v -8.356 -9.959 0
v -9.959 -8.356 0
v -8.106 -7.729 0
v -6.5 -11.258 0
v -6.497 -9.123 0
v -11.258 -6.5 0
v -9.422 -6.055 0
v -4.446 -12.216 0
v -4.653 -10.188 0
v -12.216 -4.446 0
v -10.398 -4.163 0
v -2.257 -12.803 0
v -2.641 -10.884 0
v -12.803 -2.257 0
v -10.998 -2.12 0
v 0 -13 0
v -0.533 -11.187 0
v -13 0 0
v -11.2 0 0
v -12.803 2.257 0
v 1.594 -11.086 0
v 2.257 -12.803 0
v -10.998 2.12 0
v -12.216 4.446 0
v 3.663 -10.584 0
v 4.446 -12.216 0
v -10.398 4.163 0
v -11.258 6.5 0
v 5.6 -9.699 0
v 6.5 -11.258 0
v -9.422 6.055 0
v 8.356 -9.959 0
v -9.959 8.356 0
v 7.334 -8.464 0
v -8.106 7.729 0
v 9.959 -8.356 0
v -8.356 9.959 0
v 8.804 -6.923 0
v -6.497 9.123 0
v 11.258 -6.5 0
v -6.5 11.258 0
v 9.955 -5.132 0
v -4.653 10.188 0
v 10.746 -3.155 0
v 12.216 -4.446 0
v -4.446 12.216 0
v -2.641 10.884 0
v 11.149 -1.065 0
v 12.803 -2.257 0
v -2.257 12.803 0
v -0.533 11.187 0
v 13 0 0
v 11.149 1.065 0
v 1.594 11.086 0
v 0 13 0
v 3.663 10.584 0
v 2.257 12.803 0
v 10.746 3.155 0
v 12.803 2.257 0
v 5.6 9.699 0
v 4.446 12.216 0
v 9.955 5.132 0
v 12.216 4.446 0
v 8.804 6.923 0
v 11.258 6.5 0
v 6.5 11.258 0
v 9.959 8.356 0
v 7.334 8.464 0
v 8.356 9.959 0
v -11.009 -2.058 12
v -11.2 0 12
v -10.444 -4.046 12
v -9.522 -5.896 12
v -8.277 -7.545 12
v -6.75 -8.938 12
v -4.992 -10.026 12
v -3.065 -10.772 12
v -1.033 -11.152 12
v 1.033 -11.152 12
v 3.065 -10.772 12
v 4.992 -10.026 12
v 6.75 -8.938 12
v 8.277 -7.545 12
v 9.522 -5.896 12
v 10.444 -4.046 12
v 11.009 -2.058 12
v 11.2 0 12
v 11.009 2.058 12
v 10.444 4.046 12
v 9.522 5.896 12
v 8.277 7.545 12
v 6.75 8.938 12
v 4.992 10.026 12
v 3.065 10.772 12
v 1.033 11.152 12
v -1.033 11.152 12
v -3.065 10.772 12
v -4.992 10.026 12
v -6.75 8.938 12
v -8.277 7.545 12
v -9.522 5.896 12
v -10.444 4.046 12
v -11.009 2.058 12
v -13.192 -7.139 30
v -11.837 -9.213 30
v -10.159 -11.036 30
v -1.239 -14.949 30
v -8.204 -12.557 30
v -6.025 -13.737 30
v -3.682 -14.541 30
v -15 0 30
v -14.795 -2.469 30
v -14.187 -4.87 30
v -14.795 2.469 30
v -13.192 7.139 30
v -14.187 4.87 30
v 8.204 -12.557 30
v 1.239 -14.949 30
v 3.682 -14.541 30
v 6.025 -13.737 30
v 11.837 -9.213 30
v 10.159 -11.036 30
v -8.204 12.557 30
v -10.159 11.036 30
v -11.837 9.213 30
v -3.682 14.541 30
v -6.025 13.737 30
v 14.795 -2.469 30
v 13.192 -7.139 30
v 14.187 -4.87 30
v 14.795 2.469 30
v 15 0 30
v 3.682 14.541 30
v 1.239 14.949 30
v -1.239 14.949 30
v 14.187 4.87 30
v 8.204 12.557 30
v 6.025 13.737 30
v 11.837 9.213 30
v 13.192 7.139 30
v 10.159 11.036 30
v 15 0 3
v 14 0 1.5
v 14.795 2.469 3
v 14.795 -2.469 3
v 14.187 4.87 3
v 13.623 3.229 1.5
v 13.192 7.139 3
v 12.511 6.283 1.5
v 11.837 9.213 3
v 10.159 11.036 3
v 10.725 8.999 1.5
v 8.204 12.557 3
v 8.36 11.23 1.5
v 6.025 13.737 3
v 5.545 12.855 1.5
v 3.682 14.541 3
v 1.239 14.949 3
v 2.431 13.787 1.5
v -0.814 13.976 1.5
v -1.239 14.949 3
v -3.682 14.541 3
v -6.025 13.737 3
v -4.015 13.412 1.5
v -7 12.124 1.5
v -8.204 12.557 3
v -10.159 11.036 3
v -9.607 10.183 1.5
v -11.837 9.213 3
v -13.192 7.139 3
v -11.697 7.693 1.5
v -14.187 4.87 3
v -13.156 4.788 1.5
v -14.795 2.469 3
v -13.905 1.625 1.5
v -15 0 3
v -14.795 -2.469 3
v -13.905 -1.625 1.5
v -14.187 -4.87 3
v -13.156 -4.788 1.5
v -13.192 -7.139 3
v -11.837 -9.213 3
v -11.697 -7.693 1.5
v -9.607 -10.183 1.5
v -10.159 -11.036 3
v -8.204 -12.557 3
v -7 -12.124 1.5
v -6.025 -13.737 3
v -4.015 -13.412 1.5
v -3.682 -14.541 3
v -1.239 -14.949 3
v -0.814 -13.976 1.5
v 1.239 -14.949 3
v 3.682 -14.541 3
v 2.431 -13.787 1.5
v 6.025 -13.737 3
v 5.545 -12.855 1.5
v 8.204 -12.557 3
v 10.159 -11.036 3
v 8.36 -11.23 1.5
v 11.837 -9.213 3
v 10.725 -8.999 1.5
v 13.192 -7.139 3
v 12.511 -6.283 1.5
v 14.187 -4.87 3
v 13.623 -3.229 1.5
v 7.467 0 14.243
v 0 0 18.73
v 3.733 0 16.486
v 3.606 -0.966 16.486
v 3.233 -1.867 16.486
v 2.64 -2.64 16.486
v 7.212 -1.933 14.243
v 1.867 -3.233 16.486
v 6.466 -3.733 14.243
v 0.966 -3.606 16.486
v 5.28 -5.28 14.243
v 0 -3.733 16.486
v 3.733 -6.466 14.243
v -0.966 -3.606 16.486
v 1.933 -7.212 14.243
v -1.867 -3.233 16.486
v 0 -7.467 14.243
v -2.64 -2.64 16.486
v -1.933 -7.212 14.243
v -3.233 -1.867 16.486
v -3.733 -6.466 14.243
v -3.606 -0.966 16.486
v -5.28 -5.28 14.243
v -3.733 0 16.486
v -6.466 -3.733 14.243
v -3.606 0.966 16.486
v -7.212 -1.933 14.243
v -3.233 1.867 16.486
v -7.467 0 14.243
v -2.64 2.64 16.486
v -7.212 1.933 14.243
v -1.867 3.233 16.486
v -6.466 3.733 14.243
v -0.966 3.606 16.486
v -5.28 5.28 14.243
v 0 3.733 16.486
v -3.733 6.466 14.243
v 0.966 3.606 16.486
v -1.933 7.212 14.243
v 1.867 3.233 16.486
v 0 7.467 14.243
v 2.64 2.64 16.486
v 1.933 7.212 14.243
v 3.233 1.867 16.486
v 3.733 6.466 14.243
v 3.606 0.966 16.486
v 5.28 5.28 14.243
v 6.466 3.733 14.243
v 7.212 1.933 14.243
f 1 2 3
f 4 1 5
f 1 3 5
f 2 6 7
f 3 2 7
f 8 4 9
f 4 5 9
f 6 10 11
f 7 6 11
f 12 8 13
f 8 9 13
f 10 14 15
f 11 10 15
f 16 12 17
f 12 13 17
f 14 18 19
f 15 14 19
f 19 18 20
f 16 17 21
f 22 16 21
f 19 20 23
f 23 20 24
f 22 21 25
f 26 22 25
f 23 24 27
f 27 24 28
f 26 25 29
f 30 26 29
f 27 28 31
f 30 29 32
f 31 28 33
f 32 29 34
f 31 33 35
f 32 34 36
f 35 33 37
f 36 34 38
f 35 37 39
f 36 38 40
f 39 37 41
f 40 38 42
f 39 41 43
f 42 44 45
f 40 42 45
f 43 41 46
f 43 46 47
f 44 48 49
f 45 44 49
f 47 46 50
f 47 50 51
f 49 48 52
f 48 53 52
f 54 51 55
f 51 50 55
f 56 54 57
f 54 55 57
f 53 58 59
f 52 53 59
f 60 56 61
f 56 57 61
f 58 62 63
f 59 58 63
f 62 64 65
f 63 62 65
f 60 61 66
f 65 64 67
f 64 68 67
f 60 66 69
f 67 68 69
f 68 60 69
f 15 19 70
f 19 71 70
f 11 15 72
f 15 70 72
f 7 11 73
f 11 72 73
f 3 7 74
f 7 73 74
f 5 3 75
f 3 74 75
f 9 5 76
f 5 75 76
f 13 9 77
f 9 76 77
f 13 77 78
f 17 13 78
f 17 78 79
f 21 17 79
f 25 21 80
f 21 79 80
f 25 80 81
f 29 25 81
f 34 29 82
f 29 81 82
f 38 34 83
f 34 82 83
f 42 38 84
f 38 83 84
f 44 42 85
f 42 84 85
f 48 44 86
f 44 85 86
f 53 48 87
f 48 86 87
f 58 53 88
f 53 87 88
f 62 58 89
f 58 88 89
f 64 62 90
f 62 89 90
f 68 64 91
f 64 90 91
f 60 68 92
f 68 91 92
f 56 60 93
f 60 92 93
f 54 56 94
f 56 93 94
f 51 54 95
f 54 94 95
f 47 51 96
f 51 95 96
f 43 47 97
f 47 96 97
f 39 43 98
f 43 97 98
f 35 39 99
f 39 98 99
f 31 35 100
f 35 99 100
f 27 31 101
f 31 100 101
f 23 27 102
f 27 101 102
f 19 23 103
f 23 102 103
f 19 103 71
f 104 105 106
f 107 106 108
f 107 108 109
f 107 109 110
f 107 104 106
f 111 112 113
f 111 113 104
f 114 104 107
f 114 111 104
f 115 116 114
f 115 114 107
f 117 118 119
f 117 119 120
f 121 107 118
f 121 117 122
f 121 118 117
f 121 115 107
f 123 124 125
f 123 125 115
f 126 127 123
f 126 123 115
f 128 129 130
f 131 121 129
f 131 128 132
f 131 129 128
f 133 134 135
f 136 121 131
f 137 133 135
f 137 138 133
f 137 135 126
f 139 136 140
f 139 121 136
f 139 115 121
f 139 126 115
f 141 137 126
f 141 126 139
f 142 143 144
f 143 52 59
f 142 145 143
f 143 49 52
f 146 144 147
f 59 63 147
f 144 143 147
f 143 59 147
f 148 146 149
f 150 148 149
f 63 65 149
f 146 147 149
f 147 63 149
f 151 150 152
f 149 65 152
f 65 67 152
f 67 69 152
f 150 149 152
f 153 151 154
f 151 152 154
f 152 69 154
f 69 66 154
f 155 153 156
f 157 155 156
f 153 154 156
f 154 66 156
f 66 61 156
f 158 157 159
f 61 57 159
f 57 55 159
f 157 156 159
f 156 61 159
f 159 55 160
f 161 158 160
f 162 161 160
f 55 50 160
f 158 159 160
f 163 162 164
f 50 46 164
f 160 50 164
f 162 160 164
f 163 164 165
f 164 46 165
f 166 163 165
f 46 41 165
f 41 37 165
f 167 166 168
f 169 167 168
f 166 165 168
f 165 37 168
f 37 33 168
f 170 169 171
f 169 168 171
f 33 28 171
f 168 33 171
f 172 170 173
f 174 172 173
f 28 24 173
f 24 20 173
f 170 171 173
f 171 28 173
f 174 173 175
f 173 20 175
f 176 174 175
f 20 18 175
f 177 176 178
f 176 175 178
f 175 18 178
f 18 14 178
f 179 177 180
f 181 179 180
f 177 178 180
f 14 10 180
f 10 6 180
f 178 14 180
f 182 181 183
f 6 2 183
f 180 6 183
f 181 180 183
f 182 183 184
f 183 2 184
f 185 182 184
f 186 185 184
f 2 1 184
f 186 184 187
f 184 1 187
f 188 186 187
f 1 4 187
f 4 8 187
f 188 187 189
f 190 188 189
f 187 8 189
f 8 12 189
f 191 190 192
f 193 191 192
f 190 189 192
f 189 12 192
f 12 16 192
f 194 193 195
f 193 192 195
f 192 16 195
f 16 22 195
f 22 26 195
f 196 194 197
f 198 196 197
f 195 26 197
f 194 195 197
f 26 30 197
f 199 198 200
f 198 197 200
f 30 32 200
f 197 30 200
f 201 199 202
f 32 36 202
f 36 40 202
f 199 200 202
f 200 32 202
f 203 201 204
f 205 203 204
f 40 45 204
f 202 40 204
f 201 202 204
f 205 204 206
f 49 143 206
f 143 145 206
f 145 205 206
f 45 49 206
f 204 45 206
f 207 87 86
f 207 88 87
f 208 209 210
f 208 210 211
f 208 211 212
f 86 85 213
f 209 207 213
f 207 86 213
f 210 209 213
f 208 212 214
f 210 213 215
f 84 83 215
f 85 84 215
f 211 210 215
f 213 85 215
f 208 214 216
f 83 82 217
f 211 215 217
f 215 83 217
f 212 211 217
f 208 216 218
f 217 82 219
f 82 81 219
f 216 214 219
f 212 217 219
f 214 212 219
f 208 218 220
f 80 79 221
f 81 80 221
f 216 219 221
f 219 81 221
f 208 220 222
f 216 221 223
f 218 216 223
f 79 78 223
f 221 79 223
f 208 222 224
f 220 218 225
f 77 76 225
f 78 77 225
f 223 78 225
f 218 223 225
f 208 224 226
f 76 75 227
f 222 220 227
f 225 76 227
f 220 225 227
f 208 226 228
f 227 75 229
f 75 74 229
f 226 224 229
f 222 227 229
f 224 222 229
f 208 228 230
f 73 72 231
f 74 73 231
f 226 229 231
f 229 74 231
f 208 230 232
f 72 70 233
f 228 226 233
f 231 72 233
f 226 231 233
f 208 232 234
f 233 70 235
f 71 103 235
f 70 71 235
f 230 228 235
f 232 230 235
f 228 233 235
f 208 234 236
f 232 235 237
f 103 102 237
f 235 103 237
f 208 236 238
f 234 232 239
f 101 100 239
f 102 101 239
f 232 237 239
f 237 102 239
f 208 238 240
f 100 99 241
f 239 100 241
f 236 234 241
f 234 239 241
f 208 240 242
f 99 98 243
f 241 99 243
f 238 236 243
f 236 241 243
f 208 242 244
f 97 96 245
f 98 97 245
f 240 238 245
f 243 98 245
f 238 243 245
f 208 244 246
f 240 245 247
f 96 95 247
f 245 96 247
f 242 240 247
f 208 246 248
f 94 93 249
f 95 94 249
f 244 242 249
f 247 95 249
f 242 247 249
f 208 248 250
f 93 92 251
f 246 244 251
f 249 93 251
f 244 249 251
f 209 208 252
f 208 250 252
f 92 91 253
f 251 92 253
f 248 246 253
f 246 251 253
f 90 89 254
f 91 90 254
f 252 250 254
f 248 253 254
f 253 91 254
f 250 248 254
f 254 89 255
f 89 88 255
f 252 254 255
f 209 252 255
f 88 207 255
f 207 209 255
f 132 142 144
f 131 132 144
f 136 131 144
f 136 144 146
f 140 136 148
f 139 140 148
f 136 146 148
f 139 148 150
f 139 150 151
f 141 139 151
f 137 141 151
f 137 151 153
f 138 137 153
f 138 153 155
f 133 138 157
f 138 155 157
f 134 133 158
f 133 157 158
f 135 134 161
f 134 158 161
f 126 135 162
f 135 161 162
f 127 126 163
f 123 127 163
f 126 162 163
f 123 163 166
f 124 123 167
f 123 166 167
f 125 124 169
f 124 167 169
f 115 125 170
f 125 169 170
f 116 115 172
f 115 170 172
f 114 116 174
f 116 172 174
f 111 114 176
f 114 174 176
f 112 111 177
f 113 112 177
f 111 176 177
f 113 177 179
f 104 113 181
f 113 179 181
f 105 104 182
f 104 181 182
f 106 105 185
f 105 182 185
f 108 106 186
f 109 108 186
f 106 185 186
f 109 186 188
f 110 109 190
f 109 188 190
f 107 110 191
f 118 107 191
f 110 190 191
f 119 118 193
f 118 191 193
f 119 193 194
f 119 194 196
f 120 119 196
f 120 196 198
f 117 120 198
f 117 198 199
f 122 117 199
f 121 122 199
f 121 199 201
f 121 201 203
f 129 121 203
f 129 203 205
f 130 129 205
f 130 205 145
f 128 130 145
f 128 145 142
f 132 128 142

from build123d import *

# Parameters (mm, degrees)
F0_R     = 15
F1_DEPTH = 30
F3_D     = 22.4
F3_DEPTH = 12
F3_TIP   = 6.7296389331
F4_SIZE2 = 2
F4_SIZE  = 3


with BuildPart() as f1:
    # F0 (on Top) → F1 (new body)
    with BuildSketch(Plane.XY):
        Circle(F0_R)
    extrude(amount=F1_DEPTH)

    # F3
    with Locations(Plane(origin=(0, 0, 0), x_dir=(1, 0, 0), z_dir=(0, 0, -1))):
        with Locations((0, 0)):
            Hole(F3_D / 2, depth=F3_DEPTH)
            with Locations((0, 0, -(F3_DEPTH + F3_TIP / 2))):  # 118° drill point
                Cone(0, F3_D / 2, F3_TIP, mode=Mode.SUBTRACT)

    # F4
    f4_edges = [f1.edges().sort_by_distance(p)[0] for p in [
        (-15, 0, 0),
    ]]
    f4_side = f1.faces().sort_by_distance((-15, 0, 15))[0]
    chamfer(f4_edges, length=F4_SIZE, length2=F4_SIZE2, reference=f4_side)


solid = f1.part
